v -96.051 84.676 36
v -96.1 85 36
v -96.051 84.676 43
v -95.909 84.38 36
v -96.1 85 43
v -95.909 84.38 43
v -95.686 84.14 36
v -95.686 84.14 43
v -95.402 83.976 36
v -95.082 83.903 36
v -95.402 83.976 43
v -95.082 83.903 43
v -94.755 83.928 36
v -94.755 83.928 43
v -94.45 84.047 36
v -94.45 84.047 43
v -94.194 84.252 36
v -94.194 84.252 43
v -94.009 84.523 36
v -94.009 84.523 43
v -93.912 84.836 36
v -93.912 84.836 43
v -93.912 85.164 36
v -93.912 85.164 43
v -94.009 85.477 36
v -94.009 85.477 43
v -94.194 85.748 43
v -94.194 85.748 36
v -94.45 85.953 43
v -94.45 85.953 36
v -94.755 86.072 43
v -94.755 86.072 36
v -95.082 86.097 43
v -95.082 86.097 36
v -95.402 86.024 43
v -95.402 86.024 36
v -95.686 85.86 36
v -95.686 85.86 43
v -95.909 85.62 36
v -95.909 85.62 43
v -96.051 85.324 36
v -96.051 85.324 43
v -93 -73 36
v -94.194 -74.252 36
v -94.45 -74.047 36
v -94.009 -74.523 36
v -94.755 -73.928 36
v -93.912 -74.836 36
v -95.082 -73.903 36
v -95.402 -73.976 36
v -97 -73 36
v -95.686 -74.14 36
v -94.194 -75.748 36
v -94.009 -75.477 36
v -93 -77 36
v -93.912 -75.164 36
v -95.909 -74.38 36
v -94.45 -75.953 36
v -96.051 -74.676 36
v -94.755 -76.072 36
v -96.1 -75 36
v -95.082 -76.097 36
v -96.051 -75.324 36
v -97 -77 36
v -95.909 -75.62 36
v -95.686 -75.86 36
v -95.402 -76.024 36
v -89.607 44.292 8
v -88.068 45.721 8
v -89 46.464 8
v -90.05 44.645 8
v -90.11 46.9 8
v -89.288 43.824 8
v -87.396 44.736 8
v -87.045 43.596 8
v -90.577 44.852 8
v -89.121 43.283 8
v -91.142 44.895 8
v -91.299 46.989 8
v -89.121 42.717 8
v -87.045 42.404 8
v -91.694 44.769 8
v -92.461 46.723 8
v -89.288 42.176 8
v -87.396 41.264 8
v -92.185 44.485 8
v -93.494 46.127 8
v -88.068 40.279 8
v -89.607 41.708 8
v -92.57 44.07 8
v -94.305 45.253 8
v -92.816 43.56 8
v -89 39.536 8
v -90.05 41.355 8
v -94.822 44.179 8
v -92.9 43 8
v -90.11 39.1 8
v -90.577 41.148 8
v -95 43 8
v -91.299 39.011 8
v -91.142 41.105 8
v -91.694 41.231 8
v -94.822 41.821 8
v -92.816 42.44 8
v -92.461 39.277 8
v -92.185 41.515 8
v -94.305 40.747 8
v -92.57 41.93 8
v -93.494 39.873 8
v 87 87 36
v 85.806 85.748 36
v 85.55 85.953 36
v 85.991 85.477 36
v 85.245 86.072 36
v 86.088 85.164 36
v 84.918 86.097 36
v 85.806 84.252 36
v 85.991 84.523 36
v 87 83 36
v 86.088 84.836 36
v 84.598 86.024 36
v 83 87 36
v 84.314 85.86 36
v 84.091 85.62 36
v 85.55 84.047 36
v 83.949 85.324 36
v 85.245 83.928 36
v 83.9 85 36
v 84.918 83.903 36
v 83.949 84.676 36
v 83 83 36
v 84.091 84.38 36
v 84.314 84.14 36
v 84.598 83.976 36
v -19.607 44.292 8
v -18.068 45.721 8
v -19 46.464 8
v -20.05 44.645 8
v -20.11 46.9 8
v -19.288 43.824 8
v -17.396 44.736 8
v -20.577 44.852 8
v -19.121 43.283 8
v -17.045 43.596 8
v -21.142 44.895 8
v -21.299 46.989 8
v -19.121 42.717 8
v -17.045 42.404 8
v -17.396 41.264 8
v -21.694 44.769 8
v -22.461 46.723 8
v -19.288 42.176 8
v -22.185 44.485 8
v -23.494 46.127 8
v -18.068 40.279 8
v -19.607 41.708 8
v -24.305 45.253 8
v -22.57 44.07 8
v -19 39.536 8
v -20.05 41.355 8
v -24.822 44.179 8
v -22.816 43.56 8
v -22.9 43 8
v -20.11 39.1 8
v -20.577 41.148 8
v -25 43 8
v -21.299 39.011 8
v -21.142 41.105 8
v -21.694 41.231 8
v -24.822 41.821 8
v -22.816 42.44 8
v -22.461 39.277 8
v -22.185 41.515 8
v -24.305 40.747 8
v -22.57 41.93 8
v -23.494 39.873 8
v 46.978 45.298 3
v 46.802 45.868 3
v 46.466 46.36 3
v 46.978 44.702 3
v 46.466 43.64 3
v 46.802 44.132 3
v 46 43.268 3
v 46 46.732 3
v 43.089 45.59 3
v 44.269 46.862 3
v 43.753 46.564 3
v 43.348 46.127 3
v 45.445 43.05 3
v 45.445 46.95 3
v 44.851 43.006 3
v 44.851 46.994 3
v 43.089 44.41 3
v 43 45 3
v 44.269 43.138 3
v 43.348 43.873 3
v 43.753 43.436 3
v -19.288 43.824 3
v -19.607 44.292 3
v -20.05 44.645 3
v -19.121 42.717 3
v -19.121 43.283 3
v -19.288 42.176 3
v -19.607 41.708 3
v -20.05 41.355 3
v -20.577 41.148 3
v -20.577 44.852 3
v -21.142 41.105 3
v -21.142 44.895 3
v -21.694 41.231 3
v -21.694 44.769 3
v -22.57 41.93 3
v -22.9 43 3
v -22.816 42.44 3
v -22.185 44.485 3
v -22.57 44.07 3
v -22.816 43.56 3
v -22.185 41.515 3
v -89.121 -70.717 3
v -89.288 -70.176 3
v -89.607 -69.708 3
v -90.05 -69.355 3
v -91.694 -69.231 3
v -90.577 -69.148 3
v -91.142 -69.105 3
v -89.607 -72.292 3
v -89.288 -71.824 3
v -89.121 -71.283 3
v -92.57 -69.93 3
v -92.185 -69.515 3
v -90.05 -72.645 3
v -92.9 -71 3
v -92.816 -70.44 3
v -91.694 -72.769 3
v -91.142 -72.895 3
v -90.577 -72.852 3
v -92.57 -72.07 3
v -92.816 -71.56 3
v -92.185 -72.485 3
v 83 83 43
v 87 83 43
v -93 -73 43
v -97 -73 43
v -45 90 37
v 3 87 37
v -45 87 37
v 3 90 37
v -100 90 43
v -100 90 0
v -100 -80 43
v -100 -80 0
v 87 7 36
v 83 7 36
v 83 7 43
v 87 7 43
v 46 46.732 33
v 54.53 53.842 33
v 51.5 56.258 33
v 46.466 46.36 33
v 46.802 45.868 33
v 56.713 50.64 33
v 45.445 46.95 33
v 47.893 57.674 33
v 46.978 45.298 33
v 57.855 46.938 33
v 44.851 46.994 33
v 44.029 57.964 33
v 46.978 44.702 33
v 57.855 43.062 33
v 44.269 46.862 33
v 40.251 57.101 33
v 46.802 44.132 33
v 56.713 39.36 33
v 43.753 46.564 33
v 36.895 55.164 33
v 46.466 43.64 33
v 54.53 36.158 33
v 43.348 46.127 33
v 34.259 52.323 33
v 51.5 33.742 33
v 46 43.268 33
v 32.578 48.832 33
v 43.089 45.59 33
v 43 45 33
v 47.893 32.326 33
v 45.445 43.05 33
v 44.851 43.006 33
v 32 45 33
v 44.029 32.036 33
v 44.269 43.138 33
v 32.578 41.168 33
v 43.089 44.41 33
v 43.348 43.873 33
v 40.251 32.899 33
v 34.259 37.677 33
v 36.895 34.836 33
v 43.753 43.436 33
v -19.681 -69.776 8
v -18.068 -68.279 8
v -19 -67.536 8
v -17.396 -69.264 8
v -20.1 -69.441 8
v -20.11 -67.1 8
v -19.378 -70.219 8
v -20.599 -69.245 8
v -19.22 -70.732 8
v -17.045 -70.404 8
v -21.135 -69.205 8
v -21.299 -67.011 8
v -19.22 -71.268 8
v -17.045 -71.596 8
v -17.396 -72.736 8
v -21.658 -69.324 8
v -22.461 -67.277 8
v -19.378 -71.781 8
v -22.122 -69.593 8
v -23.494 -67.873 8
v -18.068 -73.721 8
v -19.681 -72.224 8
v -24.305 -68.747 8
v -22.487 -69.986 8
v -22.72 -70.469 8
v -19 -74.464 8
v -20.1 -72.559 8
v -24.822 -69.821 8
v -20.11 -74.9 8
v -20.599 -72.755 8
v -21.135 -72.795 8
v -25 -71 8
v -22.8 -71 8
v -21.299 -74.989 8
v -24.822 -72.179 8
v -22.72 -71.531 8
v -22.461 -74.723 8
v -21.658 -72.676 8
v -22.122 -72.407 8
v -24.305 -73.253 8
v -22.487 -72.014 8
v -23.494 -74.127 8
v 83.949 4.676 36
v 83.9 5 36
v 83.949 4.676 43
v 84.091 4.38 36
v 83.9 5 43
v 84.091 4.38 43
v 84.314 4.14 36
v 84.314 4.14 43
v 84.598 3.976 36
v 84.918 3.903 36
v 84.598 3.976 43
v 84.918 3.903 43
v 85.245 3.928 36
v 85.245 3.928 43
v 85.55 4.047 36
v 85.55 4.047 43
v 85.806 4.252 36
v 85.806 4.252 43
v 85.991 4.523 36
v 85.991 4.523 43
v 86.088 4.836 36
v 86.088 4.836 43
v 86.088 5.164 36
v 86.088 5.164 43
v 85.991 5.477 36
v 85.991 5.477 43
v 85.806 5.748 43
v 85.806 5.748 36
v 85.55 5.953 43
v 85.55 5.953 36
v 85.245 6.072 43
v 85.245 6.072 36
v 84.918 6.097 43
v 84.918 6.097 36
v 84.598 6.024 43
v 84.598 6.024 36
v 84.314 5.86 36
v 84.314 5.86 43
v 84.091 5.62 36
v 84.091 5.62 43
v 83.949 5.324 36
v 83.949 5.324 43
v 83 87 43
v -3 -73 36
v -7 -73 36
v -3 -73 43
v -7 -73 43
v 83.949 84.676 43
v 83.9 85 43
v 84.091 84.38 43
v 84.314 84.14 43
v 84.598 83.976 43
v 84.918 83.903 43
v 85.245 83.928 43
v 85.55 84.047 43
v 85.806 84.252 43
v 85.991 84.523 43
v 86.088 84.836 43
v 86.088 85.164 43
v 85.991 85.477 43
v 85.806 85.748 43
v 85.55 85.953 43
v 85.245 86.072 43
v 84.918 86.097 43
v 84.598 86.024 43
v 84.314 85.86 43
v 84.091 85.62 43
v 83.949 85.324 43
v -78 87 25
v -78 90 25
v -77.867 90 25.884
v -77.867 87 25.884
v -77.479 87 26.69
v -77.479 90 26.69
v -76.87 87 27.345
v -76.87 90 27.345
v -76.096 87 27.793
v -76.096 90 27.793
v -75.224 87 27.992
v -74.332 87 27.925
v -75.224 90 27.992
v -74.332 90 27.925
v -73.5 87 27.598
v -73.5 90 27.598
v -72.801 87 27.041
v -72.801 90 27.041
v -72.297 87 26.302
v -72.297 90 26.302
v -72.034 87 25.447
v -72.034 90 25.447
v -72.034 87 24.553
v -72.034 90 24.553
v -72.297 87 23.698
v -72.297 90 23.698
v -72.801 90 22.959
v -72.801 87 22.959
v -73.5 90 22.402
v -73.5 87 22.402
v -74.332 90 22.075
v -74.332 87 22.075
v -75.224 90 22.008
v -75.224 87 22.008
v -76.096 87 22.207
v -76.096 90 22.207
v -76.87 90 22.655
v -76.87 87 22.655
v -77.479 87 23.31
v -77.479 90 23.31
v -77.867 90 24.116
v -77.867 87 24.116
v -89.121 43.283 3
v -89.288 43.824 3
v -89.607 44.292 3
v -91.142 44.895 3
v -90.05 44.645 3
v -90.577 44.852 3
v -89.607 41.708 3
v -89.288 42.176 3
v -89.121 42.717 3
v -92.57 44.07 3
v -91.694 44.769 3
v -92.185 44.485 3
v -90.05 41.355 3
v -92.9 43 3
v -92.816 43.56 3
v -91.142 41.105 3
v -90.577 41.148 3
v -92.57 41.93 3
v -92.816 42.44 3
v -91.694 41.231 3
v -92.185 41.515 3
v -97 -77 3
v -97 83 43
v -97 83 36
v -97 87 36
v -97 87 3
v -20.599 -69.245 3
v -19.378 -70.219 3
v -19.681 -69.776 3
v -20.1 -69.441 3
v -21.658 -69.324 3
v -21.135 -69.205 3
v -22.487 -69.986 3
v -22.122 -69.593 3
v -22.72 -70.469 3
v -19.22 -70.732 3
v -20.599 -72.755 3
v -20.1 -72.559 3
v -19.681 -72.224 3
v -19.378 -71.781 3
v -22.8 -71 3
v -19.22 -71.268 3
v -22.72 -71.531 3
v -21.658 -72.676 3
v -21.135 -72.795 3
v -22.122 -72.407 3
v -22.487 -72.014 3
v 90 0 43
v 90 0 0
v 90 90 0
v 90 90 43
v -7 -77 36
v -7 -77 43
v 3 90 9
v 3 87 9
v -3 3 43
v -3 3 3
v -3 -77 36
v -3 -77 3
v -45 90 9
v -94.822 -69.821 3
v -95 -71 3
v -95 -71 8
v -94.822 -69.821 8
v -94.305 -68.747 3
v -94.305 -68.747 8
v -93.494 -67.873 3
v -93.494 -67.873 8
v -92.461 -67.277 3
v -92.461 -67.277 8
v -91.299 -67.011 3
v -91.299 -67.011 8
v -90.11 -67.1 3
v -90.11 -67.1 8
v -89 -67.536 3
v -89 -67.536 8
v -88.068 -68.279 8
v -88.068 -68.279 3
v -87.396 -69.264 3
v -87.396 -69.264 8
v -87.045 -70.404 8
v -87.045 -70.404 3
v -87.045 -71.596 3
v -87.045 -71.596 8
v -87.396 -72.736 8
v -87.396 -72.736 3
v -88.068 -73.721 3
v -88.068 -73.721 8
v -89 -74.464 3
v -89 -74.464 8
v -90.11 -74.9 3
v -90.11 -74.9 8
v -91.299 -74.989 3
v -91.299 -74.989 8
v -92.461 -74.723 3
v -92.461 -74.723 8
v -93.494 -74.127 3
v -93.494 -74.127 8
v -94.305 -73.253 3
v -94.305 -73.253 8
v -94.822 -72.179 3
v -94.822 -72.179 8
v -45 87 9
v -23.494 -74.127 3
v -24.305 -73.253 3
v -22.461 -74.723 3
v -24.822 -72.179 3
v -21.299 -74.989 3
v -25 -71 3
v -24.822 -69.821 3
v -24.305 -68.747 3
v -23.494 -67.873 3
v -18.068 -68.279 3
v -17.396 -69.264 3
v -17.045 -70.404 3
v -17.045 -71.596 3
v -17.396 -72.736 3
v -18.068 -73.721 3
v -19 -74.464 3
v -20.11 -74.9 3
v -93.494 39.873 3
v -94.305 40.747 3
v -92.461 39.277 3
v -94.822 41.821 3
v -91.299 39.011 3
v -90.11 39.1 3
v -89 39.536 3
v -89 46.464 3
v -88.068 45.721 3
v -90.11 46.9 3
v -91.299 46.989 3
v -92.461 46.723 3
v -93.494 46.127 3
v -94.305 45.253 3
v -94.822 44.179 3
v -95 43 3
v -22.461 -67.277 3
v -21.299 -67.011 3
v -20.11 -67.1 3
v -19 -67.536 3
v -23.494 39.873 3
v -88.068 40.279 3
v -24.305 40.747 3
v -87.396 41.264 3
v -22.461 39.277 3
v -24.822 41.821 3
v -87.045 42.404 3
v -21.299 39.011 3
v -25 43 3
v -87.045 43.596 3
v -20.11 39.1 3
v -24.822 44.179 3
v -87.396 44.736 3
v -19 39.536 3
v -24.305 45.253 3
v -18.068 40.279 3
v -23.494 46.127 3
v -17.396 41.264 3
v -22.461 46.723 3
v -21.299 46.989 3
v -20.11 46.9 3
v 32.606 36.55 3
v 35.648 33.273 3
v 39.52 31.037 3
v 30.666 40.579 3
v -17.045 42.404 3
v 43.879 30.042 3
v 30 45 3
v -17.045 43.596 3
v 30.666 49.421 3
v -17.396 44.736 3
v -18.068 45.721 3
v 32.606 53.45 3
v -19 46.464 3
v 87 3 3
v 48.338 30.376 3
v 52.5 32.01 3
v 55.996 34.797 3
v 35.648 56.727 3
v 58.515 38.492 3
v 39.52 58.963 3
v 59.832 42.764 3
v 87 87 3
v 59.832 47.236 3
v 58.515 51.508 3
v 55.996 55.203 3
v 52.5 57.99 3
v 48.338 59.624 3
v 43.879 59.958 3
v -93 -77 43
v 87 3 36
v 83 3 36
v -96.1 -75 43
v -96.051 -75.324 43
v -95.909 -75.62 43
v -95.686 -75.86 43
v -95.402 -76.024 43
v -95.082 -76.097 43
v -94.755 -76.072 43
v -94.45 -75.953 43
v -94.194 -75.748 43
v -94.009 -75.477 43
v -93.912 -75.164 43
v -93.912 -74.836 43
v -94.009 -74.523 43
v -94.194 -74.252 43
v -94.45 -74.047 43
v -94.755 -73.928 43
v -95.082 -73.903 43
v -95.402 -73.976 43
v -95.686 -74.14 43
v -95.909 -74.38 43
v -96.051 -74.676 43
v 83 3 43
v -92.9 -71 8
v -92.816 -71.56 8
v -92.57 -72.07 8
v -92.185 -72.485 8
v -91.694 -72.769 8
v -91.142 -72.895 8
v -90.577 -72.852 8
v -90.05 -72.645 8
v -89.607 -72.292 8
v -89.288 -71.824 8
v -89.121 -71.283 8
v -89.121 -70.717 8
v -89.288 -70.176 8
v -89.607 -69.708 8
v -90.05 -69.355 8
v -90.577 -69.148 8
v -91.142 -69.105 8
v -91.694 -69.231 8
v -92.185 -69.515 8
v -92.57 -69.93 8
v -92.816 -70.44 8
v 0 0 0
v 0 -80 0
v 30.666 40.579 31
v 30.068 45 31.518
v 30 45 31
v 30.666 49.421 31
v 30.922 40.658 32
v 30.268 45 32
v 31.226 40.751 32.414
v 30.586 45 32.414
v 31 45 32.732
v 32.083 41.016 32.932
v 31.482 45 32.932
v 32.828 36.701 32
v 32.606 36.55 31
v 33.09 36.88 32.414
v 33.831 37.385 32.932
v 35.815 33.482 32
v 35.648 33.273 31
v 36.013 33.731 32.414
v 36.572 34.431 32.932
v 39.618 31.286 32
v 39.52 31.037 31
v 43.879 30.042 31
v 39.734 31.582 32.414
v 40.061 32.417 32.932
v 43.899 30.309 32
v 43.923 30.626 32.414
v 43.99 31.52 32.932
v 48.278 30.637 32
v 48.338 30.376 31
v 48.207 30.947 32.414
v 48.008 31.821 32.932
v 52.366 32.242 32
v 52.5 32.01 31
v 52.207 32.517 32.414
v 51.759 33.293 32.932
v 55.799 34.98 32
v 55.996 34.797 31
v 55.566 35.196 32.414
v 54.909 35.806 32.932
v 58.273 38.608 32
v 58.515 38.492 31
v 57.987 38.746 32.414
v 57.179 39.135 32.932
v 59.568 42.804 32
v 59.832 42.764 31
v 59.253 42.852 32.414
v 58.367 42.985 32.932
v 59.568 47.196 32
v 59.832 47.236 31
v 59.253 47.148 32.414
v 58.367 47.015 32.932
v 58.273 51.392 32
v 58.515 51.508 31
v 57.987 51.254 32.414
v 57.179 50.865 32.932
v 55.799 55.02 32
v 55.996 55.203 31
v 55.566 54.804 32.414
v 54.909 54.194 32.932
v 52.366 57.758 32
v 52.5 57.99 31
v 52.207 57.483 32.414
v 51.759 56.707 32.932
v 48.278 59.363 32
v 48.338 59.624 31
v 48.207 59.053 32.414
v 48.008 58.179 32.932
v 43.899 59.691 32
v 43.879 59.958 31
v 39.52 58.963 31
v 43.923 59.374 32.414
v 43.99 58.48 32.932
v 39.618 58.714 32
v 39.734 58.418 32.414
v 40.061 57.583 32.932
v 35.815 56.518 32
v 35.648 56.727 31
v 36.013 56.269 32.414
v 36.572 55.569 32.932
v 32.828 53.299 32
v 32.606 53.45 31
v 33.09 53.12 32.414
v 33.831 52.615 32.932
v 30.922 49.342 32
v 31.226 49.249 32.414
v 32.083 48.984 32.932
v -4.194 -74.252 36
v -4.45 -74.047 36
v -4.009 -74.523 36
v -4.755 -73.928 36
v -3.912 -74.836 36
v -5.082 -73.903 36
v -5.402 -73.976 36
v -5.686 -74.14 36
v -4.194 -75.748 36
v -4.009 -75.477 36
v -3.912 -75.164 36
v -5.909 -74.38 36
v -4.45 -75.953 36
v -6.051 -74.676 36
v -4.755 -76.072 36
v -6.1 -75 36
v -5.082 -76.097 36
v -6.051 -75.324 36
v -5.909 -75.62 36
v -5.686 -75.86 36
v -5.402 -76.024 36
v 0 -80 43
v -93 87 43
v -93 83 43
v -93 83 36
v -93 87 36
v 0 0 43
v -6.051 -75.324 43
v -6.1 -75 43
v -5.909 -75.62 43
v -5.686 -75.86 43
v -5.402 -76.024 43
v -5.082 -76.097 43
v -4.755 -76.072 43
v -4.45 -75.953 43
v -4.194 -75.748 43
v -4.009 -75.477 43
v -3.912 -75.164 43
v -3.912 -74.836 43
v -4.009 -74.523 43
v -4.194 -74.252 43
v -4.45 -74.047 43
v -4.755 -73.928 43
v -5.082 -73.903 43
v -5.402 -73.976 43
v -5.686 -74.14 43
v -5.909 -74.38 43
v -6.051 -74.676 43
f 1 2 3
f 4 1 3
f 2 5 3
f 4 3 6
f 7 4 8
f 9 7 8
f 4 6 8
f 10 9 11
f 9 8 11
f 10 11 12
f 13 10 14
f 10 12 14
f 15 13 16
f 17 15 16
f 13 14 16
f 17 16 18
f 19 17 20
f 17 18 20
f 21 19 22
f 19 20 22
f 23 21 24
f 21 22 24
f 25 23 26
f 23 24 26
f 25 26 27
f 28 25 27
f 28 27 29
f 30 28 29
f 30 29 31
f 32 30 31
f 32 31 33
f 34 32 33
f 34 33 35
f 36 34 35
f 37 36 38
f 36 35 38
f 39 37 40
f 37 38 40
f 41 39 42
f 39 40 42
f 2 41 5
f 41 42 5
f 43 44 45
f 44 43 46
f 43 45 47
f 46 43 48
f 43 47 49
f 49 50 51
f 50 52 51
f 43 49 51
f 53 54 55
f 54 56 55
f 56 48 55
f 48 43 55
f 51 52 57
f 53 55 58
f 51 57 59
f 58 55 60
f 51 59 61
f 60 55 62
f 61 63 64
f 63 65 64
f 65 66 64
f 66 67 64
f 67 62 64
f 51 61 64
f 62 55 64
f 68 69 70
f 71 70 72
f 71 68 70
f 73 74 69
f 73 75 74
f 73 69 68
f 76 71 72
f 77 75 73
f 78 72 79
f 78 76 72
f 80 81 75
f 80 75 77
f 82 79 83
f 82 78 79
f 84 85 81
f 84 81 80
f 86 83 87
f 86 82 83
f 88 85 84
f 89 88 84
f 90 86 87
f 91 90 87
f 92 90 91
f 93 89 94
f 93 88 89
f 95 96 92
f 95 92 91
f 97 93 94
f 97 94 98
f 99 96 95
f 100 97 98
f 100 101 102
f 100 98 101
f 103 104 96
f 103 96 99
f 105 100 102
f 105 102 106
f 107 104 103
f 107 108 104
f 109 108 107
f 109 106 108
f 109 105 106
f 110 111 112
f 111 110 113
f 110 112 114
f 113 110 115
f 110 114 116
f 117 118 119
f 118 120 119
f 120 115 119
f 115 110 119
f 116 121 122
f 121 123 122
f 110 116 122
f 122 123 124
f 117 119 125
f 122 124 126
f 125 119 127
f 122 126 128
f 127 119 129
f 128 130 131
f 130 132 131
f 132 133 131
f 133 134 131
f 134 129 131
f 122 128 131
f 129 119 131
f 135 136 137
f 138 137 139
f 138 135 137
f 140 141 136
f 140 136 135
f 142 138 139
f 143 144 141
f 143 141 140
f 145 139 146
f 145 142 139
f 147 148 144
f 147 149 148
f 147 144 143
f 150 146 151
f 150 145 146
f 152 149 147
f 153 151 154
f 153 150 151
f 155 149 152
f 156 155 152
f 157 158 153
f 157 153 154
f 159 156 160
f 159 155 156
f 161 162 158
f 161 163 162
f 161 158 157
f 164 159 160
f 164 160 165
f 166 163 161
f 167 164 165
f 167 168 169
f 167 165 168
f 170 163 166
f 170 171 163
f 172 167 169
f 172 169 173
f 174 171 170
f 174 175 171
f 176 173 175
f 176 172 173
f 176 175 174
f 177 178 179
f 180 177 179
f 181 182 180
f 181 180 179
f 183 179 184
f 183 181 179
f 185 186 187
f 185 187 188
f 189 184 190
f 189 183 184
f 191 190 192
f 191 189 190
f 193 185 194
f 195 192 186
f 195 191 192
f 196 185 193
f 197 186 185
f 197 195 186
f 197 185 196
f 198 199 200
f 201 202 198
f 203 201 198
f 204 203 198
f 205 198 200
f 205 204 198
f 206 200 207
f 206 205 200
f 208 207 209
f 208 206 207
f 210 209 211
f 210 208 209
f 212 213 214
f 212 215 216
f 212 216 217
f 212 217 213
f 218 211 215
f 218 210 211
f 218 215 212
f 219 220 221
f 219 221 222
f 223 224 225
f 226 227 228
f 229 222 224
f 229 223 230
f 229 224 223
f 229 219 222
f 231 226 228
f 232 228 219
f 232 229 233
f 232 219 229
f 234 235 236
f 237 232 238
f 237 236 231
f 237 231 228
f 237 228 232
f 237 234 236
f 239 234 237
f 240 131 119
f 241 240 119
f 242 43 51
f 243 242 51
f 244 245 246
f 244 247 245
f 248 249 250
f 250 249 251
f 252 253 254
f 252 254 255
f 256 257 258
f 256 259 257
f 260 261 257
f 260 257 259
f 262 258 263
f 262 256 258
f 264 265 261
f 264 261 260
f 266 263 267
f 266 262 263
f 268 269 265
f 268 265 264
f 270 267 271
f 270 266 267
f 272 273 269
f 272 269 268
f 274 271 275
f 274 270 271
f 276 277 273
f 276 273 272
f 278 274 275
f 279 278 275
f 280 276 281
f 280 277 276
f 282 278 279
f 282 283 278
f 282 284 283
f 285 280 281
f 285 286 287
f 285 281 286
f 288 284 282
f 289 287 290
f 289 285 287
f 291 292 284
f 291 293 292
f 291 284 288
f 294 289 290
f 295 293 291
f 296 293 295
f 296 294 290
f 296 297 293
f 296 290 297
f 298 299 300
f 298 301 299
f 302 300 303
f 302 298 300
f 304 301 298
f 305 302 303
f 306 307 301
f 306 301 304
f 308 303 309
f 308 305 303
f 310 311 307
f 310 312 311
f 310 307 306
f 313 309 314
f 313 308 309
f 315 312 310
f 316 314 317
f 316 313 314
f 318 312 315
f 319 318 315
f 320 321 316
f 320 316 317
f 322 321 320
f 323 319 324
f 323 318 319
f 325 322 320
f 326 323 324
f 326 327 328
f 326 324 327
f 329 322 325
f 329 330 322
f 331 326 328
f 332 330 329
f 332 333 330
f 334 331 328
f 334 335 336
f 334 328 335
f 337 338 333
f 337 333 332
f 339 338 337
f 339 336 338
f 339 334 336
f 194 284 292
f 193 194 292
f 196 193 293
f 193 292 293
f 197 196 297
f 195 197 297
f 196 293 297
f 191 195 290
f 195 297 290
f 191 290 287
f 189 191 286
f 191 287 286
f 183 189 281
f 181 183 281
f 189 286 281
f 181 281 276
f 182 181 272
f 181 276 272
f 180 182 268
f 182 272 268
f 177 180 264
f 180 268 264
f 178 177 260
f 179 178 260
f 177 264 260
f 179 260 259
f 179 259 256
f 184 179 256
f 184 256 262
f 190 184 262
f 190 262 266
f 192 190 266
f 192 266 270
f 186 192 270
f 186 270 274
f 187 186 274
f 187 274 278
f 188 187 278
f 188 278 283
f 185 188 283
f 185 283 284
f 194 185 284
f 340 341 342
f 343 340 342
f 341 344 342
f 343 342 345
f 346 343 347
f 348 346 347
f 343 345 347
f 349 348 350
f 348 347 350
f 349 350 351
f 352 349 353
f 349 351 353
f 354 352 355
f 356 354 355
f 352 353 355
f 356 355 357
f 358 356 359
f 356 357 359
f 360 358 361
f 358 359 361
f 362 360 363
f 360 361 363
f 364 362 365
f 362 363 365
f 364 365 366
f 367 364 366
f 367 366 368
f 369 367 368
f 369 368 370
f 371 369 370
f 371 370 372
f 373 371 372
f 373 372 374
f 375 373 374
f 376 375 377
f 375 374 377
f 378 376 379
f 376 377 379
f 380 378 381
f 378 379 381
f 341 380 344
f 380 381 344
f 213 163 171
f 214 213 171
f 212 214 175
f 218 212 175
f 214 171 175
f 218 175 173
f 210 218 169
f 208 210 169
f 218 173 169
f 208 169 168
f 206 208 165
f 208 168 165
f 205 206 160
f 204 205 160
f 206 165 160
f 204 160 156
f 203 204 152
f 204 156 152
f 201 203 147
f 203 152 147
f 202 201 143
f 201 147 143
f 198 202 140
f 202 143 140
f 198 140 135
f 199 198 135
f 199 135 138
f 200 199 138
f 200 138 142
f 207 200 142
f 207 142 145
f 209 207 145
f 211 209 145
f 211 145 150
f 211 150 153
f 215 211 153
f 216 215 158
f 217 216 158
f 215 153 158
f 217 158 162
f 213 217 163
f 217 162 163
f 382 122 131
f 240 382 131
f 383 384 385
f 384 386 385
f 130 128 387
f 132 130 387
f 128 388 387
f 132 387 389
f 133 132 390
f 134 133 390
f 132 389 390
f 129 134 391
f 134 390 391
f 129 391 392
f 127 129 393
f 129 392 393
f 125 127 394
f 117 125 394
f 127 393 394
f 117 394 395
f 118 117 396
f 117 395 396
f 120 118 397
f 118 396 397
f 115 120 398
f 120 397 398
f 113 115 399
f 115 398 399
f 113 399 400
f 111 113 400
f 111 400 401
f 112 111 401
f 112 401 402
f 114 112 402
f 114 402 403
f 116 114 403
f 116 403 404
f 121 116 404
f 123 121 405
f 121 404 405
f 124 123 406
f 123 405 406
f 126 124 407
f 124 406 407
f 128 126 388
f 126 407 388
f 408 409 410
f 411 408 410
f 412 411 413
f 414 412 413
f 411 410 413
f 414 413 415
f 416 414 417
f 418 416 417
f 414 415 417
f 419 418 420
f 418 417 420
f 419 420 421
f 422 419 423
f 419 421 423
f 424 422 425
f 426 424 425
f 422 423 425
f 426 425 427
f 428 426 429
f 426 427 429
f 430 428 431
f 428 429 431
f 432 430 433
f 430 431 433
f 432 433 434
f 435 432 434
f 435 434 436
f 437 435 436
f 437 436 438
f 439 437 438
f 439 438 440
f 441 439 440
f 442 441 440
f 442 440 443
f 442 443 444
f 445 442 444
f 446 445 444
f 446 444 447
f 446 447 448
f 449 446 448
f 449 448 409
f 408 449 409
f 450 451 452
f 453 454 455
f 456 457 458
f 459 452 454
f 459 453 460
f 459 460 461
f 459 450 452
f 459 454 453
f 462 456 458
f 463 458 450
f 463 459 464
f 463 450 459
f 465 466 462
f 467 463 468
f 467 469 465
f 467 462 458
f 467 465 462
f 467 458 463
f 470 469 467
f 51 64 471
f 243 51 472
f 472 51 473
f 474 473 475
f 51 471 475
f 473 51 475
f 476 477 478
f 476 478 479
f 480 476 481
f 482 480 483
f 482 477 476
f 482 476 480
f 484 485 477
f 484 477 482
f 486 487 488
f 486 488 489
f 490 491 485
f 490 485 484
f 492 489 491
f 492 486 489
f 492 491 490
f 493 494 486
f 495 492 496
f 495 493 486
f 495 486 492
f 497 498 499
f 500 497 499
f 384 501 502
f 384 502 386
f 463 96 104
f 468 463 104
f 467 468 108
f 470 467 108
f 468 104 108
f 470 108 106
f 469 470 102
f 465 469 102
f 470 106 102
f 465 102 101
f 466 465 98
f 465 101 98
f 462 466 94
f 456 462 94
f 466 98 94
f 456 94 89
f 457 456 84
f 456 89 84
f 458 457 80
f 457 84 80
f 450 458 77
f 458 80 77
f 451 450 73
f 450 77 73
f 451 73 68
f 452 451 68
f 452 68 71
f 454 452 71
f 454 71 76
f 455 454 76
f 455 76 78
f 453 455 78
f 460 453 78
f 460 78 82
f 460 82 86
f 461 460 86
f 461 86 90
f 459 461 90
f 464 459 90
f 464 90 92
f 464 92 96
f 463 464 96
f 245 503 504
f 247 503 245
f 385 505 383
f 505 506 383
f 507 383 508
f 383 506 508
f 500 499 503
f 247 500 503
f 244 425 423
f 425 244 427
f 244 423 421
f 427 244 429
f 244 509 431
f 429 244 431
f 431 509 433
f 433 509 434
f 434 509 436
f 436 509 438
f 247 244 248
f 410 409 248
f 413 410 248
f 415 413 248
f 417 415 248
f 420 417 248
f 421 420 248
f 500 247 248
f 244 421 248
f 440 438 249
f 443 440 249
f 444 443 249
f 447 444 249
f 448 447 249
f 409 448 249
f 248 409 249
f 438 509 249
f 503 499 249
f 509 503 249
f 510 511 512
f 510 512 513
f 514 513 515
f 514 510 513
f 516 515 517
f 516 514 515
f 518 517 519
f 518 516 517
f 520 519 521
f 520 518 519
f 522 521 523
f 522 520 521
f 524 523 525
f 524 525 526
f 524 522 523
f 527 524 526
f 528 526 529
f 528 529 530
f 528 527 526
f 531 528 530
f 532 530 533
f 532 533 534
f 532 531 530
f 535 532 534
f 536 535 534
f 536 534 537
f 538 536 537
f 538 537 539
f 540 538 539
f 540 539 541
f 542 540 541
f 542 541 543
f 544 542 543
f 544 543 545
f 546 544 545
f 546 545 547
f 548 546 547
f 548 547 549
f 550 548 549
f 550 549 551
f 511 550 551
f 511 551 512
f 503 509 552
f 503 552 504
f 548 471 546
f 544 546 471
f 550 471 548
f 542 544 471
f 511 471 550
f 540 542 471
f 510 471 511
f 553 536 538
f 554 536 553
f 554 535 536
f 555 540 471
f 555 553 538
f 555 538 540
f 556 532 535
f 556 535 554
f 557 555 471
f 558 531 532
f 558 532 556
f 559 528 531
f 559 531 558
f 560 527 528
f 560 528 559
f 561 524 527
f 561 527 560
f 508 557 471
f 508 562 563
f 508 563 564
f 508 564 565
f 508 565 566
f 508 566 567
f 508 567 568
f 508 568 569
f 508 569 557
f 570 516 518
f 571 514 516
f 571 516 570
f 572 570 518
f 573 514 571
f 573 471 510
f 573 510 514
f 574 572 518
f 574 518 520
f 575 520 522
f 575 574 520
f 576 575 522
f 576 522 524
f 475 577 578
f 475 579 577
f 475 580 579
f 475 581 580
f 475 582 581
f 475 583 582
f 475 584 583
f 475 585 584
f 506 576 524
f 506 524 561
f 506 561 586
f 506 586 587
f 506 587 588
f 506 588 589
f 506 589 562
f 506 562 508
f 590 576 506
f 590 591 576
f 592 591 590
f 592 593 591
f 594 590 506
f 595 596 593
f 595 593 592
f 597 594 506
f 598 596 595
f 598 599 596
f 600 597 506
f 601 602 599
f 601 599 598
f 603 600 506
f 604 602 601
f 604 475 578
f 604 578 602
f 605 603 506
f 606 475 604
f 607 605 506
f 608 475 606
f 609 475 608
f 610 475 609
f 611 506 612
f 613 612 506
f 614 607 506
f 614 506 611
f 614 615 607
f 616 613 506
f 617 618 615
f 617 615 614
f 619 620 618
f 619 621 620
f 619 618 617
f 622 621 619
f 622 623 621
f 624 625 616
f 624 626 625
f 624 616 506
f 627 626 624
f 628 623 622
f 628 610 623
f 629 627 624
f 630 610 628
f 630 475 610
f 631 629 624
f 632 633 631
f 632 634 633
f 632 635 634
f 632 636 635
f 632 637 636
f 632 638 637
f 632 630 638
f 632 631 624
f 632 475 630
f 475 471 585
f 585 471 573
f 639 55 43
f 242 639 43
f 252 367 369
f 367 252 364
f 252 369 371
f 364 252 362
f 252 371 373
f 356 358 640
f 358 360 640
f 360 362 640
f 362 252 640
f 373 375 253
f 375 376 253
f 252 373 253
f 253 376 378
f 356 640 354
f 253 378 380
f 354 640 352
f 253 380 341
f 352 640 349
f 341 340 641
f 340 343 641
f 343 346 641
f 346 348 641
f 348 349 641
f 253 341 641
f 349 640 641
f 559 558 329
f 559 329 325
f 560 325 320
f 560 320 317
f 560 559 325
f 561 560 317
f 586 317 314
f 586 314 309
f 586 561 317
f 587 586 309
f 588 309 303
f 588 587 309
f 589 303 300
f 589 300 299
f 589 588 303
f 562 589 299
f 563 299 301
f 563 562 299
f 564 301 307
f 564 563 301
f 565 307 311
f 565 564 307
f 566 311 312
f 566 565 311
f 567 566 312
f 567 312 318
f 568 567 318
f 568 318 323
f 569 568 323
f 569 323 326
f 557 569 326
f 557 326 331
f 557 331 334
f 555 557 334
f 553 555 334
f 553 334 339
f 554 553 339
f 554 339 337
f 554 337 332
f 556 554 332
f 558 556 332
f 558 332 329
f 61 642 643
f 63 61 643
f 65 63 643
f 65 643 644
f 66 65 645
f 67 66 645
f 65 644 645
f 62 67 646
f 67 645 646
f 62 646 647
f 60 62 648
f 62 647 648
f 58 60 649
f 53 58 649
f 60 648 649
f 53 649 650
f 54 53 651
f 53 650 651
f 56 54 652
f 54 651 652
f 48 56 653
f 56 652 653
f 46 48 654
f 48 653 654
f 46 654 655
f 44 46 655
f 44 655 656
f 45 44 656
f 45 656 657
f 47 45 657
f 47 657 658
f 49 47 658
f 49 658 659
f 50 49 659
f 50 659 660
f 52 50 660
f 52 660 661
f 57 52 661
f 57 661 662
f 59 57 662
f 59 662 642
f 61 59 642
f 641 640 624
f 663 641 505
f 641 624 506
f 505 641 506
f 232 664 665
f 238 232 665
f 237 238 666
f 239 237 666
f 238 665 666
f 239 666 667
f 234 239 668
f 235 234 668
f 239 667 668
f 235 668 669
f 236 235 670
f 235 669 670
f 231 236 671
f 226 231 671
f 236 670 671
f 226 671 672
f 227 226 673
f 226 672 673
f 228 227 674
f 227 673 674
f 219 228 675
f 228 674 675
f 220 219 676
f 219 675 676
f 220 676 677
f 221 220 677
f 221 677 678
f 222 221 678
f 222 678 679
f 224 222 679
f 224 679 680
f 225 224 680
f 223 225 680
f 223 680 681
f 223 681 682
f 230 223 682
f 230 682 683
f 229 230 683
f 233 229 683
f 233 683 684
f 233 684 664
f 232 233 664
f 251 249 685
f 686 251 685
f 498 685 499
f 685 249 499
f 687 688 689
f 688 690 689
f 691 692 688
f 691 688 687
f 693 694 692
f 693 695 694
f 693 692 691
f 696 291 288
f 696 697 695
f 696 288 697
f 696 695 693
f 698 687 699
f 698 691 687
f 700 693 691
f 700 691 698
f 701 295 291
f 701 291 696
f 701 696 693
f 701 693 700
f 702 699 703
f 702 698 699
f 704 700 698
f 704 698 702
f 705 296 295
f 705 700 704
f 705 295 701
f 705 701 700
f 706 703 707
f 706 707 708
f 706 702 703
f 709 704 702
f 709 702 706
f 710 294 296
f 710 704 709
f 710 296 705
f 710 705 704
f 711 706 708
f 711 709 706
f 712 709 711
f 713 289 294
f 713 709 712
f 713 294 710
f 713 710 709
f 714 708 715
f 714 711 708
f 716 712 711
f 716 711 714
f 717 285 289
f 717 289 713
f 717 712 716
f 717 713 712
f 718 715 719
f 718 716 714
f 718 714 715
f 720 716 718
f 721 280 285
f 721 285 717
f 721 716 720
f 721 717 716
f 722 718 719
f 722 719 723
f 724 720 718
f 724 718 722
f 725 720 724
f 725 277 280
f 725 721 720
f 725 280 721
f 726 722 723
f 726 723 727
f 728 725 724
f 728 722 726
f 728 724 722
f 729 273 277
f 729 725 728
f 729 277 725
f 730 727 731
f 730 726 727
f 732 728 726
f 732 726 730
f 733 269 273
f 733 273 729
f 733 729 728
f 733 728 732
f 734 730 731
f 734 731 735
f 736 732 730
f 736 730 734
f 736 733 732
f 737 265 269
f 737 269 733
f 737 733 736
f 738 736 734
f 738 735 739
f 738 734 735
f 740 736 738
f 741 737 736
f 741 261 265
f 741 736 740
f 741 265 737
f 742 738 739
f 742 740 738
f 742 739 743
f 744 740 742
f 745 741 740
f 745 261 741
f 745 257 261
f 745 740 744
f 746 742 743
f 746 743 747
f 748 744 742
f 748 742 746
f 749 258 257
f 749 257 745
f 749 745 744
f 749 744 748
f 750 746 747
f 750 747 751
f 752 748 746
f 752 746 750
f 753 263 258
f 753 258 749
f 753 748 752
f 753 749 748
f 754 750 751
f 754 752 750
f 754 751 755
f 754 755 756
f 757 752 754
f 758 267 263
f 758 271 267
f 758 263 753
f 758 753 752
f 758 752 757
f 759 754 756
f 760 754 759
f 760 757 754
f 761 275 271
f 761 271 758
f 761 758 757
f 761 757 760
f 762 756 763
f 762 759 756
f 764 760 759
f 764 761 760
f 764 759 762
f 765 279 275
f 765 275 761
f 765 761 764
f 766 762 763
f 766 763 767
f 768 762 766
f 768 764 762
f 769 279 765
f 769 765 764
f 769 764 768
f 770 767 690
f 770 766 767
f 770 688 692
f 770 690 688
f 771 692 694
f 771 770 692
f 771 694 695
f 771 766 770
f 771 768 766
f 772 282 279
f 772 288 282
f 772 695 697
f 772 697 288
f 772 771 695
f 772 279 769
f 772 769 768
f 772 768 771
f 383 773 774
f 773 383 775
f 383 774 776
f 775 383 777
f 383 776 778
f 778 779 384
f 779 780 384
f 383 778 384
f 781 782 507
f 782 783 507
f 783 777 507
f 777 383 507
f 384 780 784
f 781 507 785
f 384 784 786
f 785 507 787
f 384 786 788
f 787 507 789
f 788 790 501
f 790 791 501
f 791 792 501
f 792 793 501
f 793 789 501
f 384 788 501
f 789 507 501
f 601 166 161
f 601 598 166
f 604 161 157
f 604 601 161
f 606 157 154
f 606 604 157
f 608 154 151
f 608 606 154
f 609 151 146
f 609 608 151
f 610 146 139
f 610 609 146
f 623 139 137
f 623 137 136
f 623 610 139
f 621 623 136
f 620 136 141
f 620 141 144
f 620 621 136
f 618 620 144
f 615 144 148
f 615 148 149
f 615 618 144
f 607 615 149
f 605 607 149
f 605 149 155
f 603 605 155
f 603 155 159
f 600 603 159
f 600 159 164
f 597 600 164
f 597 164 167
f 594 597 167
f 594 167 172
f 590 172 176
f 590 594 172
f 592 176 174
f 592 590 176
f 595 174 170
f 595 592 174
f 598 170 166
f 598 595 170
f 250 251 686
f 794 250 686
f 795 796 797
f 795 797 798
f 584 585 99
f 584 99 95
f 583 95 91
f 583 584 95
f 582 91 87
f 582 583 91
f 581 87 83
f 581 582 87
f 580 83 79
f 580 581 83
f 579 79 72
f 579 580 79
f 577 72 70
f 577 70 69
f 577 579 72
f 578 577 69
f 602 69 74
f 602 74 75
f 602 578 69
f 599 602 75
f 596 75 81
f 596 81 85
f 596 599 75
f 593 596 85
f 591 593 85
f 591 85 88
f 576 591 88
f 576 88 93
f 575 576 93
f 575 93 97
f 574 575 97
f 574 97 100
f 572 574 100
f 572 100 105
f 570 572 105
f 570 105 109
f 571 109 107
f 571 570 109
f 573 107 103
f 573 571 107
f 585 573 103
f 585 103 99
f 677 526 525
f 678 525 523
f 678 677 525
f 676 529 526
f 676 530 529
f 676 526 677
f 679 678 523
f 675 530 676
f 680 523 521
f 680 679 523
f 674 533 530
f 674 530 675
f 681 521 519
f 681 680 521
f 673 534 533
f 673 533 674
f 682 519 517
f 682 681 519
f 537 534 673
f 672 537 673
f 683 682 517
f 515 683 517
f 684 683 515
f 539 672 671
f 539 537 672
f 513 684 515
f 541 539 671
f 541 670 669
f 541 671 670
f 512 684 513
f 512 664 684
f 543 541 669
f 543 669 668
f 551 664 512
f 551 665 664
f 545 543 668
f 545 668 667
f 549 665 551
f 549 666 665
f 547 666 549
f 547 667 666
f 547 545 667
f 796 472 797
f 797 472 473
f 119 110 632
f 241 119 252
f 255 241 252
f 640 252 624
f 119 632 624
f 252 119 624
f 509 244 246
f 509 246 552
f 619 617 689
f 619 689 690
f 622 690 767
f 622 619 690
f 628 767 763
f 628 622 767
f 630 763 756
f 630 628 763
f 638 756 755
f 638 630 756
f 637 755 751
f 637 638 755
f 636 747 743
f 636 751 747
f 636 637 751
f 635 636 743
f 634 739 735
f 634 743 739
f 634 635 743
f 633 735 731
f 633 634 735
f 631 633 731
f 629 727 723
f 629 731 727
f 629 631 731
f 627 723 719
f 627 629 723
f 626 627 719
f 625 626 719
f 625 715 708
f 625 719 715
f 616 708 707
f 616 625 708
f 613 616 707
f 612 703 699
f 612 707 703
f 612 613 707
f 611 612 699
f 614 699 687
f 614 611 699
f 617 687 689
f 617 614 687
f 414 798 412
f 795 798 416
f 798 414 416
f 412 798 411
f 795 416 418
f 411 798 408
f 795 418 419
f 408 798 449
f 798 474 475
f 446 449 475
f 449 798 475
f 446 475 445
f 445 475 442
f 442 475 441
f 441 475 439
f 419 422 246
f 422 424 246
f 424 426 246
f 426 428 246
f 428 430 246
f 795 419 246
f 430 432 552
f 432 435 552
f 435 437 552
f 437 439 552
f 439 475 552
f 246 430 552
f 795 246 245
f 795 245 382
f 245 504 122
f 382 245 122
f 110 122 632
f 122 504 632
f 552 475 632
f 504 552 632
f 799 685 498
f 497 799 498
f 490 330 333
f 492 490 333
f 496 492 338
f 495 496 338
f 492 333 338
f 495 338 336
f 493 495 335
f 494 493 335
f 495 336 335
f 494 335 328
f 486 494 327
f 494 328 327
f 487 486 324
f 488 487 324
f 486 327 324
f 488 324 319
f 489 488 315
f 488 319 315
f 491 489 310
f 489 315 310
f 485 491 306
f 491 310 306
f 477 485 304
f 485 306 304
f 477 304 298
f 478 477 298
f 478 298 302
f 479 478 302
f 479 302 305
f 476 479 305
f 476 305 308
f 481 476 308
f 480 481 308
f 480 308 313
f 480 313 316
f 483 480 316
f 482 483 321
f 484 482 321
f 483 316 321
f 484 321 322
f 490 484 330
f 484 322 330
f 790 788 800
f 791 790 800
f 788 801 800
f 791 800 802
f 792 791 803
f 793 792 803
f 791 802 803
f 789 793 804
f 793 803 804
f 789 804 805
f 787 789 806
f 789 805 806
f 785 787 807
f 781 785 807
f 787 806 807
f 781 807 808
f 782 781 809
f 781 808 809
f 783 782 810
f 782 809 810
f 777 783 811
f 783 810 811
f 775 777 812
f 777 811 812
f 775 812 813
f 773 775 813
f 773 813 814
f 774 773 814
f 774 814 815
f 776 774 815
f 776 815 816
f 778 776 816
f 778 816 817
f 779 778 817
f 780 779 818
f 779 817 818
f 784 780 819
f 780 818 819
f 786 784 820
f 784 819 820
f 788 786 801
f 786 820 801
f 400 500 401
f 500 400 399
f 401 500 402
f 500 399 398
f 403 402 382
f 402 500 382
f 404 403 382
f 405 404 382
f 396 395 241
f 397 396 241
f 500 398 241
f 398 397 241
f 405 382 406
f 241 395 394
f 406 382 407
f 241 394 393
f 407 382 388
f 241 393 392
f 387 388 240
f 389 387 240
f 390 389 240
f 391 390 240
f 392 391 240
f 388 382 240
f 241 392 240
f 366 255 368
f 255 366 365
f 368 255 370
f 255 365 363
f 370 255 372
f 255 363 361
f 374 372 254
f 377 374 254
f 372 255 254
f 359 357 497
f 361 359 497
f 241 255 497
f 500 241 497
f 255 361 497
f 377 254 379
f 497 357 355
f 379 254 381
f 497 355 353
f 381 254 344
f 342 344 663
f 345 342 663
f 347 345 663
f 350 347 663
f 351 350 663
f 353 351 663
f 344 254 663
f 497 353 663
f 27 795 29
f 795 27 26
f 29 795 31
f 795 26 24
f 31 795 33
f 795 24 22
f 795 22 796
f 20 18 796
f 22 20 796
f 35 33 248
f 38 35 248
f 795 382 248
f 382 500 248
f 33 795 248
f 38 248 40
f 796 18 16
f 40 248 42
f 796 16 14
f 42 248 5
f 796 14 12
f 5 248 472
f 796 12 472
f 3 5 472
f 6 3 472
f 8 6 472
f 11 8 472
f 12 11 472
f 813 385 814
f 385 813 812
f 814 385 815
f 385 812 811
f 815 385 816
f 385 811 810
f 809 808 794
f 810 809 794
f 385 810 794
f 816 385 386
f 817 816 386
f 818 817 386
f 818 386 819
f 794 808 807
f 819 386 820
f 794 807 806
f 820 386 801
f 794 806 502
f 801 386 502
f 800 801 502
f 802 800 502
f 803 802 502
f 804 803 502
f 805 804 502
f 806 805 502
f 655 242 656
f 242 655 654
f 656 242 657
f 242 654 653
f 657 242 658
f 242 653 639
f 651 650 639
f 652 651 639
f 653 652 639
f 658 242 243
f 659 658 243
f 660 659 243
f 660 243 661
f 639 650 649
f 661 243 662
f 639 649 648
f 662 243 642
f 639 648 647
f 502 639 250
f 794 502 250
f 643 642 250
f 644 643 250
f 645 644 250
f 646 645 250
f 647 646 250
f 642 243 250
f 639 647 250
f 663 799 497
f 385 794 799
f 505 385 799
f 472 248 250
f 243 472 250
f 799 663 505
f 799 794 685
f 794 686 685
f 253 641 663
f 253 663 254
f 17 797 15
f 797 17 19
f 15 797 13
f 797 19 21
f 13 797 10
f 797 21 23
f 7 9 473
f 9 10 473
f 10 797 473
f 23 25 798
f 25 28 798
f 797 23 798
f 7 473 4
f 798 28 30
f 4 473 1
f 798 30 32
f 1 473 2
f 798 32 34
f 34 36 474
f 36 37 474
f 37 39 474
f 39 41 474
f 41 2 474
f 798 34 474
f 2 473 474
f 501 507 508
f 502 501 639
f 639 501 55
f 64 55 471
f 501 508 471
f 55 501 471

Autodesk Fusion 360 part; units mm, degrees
sketch "Sketch1" plane through (0, 0, 0) normal (0, 0, 1) x (1, 0, 0)
  line L0 (-100, 90) -> (0, 90)
  line L1 (0, 90) -> (0, -80)
  line L2 (0, -80) -> (-100, -80)
  line L3 (-100, -80) -> (-100, 90)
  line L4 (0, 90) -> (90, 90)
  line L5 (90, 90) -> (90, 0)
  line L6 (90, 0) -> (0, 0)
  line L7 (0, 0) -> (0, 90)
  dimension "d1" = 100
  dimension "d2" = 170
  dimension "d3" = 90
  dimension "d4" = 90
extrude "Extrude1" add sketch "Sketch1" along normal blind 3
sketch "Sketch2" plane through (0, 0, 3) normal (0, 0, 1) x (-1, 0, 0)
  line L0 (-90, 0) -> (-90, -90)
  line L1 (-90, -90) -> (100, -90)
  line L2 (100, -90) -> (100, 80)
  line L3 (100, 80) -> (0, 80)
  line L4 (0, 80) -> (0, 0)
  line L5 (0, 0) -> (-90, 0)
  line L6 (97, -87) -> (3, -87)
  line L7 (3, -87) -> (3, 77)
  line L8 (3, 77) -> (97, 77)
  line L9 (97, 77) -> (97, -87)
  line L10 (3, -87) -> (-87, -87)
  line L11 (-87, -87) -> (-87, -3)
  line L12 (-87, -3) -> (3, -3)
  line L13 (3, -3) -> (3, -87)
  dimension "d7" = 3
  dimension "d8" = 3
  dimension "d9" = 3
  dimension "d10" = 3
  dimension "d12" = 97
  dimension "d13" = 3
extrude "Extrude2" add sketch "Sketch2" along normal blind 40
sketch "Sketch3" plane through (0, 0, 3) normal (0, 0, 1) x (-1, 0, 0)
  line L0 (-87, -87) -> (97, -87)
  line L1 (97, -87) -> (97, 77)
  line L2 (97, 77) -> (3, 77)
  line L3 (3, 77) -> (3, -3)
  line L4 (3, -3) -> (-87, -3)
  line L5 (-87, -3) -> (-87, -87)
  circle A0 centre (-45, -45) radius 15
  line L6 (-90, -90) -> (100, -90)
  line L7 (-90, 0) -> (-90, -90)
  dimension "d16" = 30
  dimension "d17" = 45
  dimension "d18" = 45
extrude "Extrude3" add sketch "Sketch3" along normal blind 30 contours A0
sketch "Sketch4" plane through (0, 0, 33) normal (0, 0, 1) x (-1, 0, 0)
  circle A0 centre (-45, -45) radius 15
  circle A1 centre (-45, -45) radius 2
  dimension "d21" = 4
extrude "Extrude4" cut sketch "Sketch4" against normal blind 30 contours A1
fillet "Fillet1" radius 2 1 edges at (58.9849, 50.4242, 33)
sketch "Sketch5" plane through (-97, 0, 0) normal (1, 0, 0) x (0, 1, 0)
  line L0 (-77, 3) -> (87, 3)
  line L1 (87, 3) -> (87, 43)
  line L2 (87, 43) -> (-77, 43)
  line L3 (-77, 43) -> (-77, 3)
  line L4 (87, 43) -> (83, 43)
  line L5 (83, 43) -> (83, 36)
  line L6 (83, 36) -> (87, 36)
  line L7 (87, 36) -> (87, 43)
  dimension "d26" = 4
  dimension "d27" = 7
extrude "Extrude5" add sketch "Sketch5" along normal blind 4 contours L1 L2 L4 L5 L6 L7
sketch "Sketch6" plane through (0, 0, 43) normal (0, 0, 1) x (-1, 0, 0)
  line L0 (-87, -87) -> (-87, -3)
  line L1 (-87, -3) -> (3, -3)
  line L2 (3, -3) -> (3, 77)
  line L3 (3, 77) -> (97, 77)
  line L4 (97, 77) -> (97, -83)
  line L5 (97, -83) -> (93, -83)
  line L6 (93, -83) -> (93, -87)
  line L7 (93, -87) -> (-87, -87)
  line L8 (0, 0) -> (-90, 0)
  line L9 (-90, 0) -> (-90, -90)
  line L10 (-90, -90) -> (100, -90)
  line L11 (100, -90) -> (100, 80)
  line L12 (100, 80) -> (0, 80)
  line L13 (0, 80) -> (0, 0)
  line L14 (3, 77) -> (7, 77)
  line L15 (7, 77) -> (7, 73)
  line L16 (7, 73) -> (3, 73)
  line L17 (3, 73) -> (3, 77)
  line L18 (97, 77) -> (93, 77)
  line L19 (93, 77) -> (93, 73)
  line L20 (93, 73) -> (97, 73)
  line L21 (97, 73) -> (97, 77)
  line L22 (-87, -87) -> (-83, -87)
  line L23 (-83, -87) -> (-83, -83)
  line L24 (-83, -83) -> (-87, -83)
  line L25 (-87, -83) -> (-87, -87)
  line L26 (-87, -3) -> (-83, -3)
  line L27 (-83, -3) -> (-83, -7)
  line L28 (-83, -7) -> (-87, -7)
  line L29 (-87, -7) -> (-87, -3)
  circle A0 centre (-85, -5) radius 1.1
  circle A1 centre (-85, -85) radius 1.1
  circle A2 centre (5, 75) radius 1.1
  circle A3 centre (95, 75) radius 1.1
  dimension "d30" = 4
  dimension "d31" = 4
  dimension "d32" = 4
  dimension "d33" = 4
  dimension "d34" = 4
  dimension "d35" = 4
  dimension "d36" = 4
  dimension "d37" = 4
  dimension "d38" = 2.2
  dimension "d39" = 2
  dimension "d40" = 2
  dimension "d41" = 2.2
  dimension "d42" = 2
  dimension "d43" = 2
  dimension "d44" = 2.2
  dimension "d45" = 2
  dimension "d46" = 2
  dimension "d47" = 2.2
  dimension "d48" = 2
  dimension "d49" = 2
extrude "Extrude6" add sketch "Sketch6" against normal blind 7 contours L0 L7 L22 L23 L24 L25 | L0 L1 L26 L27 L28 L29 | L3 L4 L18 L19 L20 L21 | L2 L3 L14 L15 L16 L17
sketch "Sketch7" plane through (0, 0, 43) normal (0, 0, 1) x (-1, 0, 0)
  circle A0 centre (-85, -85) radius 1.1
  circle A1 centre (5, 75) radius 1.1
  circle A2 centre (-85, -5) radius 1.1
  circle A3 centre (95, 75) radius 1.1
  line L0 (-87, -83) -> (-87, -7)
  line L1 (-87, -7) -> (-83, -7)
  line L2 (-83, -7) -> (-83, -3)
  line L3 (-83, -3) -> (3, -3)
  line L4 (3, -3) -> (3, 73)
  line L5 (3, 73) -> (7, 73)
  line L6 (7, 73) -> (7, 77)
  line L7 (7, 77) -> (93, 77)
  line L8 (93, 77) -> (93, 73)
  line L9 (93, 73) -> (97, 73)
  line L10 (97, 73) -> (97, -83)
  line L11 (97, -83) -> (93, -83)
  line L12 (93, -83) -> (93, -87)
  line L13 (93, -87) -> (-83, -87)
  line L14 (-83, -87) -> (-83, -83)
  line L15 (-83, -83) -> (-87, -83)
  line L16 (0, 0) -> (-90, 0)
  line L17 (-90, 0) -> (-90, -90)
  line L18 (-90, -90) -> (100, -90)
  line L19 (100, -90) -> (100, 80)
  line L20 (100, 80) -> (0, 80)
  line L21 (0, 80) -> (0, 0)
  circle A4 centre (95, -85) radius 1.1
  dimension "d52" = 2.2
  dimension "d53" = 2
  dimension "d54" = 2
extrude "Extrude7" cut sketch "Sketch7" against normal blind 7 contours A4
sketch "Sketch8" plane through (0, 90, 0) normal (0, 1, 0) x (-1, 0, 0)
  line L0 (-90, 0) -> (100, 0)
  line L1 (100, 0) -> (100, 43)
  line L2 (100, 43) -> (-90, 43)
  line L3 (-90, 43) -> (-90, 0)
  line L4 (-3, 37) -> (45, 37)
  line L5 (45, 37) -> (45, 9)
  line L6 (45, 9) -> (-3, 9)
  line L7 (-3, 9) -> (-3, 37)
  dimension "d57" = 48
  dimension "d58" = 28
  dimension "d59" = 55
  dimension "d60" = 6
extrude "Extrude8" cut sketch "Sketch8" against normal blind 3 contours L4 L5 L6 L7
sketch "Sketch9" plane through (0, 0, 3) normal (0, 0, 1) x (-1, 0, 0)
  circle A0 centre (-45, -45) radius 15
  line L0 (-87, -87) -> (97, -87)
  line L1 (97, -87) -> (97, 77)
  line L2 (97, 77) -> (3, 77)
  line L3 (3, 77) -> (3, -3)
  line L4 (3, -3) -> (-87, -3)
  line L5 (-87, -3) -> (-87, -87)
  line L6 (21, 71) -> (91, 71)
  line L7 (91, 71) -> (91, -43)
  line L8 (91, -43) -> (21, -43)
  line L9 (21, -43) -> (21, 71)
  circle A1 centre (21, 71) radius 4
  circle A2 centre (91, 71) radius 4
  circle A3 centre (21, -43) radius 4
  circle A4 centre (91, -43) radius 4
  circle A5 centre (91, -43) radius 1.9
  circle A6 centre (21, -43) radius 1.9
  circle A7 centre (91, 71) radius 1.9
  circle A8 centre (21, 71) radius 1.9
  dimension "d63" = 70
  dimension "d64" = 114
  dimension "d65" = 6
  dimension "d66" = 6
  dimension "d67" = 8
  dimension "d68" = 8
  dimension "d69" = 8
  dimension "d70" = 8
  dimension "d79" = 3.8
  dimension "d80" = 3.8
  dimension "d81" = 3.8
  dimension "d82" = 3.8
extrude "Extrude9" add sketch "Sketch9" along normal blind 5 contours L6 L9 A8 | L6 L9 A8 | L6 L9 A1 A8 | L6 L9 A1 A8 | L6 L7 A2 A7 | L6 L7 A2 A7 | L8 L9 A3 A6 | L8 L9 A3 A6 | L6 L7 A7 | L6 L7 A7 | L8 L9 A6 | L8 L9 A6 | L7 L8 A4 A5 | L7 L8 A4 A5 | L7 L8 A5 | L7 L8 A5
sketch "Sketch10" plane through (0, 0, 8) normal (0, 0, 1) x (-1, 0, 0)
  circle A0 centre (21, 71) radius 4
  circle A1 centre (21, 71) radius 1.8
  circle A2 centre (91, 51) radius 1.8
  circle A3 centre (91, -63) radius 1.8
  circle A4 centre (27, -63) radius 1.8
  dimension "d73" = 3.6
  dimension "d74" = 3.6
  dimension "d75" = 3.6
  dimension "d76" = 3.6
extrude "Extrude10" cut sketch "Sketch10" against normal blind 5 contours A1 | A2 | A3 | A4
sketch "Sketch11" plane through (0, 0, 8) normal (0, 0, 1) x (-1, 0, 0)
  circle A0 centre (21, -43) radius 4
  circle A1 centre (21, -43) radius 1.9
  circle A2 centre (91, -43) radius 1.9
  circle A3 centre (91, -43) radius 4
  circle A4 centre (91, 71) radius 1.9
  circle A5 centre (91, 71) radius 4
  dimension "d83" = 3.8
  dimension "d84" = 3.8
  dimension "d85" = 3.8
extrude "Extrude11" cut sketch "Sketch11" against normal blind 5 contours A1 | A2 | A4
sketch "Sketch12" plane through (0, 90, 0) normal (0, 1, 0) x (-1, 0, 0)
  line L0 (45, 37) -> (45, 9)
  line L1 (45, 9) -> (-3, 9)
  line L2 (-3, 9) -> (-3, 37)
  line L3 (-3, 37) -> (45, 37)
  line L4 (-90, 0) -> (100, 0)
  line L5 (100, 0) -> (100, 43)
  line L6 (100, 43) -> (-90, 43)
  line L7 (-90, 43) -> (-90, 0)
  circle A0 centre (75, 25) radius 3
  dimension "d88" = 6
extrude "Extrude12" cut sketch "Sketch12" against normal blind 3 contours A0
